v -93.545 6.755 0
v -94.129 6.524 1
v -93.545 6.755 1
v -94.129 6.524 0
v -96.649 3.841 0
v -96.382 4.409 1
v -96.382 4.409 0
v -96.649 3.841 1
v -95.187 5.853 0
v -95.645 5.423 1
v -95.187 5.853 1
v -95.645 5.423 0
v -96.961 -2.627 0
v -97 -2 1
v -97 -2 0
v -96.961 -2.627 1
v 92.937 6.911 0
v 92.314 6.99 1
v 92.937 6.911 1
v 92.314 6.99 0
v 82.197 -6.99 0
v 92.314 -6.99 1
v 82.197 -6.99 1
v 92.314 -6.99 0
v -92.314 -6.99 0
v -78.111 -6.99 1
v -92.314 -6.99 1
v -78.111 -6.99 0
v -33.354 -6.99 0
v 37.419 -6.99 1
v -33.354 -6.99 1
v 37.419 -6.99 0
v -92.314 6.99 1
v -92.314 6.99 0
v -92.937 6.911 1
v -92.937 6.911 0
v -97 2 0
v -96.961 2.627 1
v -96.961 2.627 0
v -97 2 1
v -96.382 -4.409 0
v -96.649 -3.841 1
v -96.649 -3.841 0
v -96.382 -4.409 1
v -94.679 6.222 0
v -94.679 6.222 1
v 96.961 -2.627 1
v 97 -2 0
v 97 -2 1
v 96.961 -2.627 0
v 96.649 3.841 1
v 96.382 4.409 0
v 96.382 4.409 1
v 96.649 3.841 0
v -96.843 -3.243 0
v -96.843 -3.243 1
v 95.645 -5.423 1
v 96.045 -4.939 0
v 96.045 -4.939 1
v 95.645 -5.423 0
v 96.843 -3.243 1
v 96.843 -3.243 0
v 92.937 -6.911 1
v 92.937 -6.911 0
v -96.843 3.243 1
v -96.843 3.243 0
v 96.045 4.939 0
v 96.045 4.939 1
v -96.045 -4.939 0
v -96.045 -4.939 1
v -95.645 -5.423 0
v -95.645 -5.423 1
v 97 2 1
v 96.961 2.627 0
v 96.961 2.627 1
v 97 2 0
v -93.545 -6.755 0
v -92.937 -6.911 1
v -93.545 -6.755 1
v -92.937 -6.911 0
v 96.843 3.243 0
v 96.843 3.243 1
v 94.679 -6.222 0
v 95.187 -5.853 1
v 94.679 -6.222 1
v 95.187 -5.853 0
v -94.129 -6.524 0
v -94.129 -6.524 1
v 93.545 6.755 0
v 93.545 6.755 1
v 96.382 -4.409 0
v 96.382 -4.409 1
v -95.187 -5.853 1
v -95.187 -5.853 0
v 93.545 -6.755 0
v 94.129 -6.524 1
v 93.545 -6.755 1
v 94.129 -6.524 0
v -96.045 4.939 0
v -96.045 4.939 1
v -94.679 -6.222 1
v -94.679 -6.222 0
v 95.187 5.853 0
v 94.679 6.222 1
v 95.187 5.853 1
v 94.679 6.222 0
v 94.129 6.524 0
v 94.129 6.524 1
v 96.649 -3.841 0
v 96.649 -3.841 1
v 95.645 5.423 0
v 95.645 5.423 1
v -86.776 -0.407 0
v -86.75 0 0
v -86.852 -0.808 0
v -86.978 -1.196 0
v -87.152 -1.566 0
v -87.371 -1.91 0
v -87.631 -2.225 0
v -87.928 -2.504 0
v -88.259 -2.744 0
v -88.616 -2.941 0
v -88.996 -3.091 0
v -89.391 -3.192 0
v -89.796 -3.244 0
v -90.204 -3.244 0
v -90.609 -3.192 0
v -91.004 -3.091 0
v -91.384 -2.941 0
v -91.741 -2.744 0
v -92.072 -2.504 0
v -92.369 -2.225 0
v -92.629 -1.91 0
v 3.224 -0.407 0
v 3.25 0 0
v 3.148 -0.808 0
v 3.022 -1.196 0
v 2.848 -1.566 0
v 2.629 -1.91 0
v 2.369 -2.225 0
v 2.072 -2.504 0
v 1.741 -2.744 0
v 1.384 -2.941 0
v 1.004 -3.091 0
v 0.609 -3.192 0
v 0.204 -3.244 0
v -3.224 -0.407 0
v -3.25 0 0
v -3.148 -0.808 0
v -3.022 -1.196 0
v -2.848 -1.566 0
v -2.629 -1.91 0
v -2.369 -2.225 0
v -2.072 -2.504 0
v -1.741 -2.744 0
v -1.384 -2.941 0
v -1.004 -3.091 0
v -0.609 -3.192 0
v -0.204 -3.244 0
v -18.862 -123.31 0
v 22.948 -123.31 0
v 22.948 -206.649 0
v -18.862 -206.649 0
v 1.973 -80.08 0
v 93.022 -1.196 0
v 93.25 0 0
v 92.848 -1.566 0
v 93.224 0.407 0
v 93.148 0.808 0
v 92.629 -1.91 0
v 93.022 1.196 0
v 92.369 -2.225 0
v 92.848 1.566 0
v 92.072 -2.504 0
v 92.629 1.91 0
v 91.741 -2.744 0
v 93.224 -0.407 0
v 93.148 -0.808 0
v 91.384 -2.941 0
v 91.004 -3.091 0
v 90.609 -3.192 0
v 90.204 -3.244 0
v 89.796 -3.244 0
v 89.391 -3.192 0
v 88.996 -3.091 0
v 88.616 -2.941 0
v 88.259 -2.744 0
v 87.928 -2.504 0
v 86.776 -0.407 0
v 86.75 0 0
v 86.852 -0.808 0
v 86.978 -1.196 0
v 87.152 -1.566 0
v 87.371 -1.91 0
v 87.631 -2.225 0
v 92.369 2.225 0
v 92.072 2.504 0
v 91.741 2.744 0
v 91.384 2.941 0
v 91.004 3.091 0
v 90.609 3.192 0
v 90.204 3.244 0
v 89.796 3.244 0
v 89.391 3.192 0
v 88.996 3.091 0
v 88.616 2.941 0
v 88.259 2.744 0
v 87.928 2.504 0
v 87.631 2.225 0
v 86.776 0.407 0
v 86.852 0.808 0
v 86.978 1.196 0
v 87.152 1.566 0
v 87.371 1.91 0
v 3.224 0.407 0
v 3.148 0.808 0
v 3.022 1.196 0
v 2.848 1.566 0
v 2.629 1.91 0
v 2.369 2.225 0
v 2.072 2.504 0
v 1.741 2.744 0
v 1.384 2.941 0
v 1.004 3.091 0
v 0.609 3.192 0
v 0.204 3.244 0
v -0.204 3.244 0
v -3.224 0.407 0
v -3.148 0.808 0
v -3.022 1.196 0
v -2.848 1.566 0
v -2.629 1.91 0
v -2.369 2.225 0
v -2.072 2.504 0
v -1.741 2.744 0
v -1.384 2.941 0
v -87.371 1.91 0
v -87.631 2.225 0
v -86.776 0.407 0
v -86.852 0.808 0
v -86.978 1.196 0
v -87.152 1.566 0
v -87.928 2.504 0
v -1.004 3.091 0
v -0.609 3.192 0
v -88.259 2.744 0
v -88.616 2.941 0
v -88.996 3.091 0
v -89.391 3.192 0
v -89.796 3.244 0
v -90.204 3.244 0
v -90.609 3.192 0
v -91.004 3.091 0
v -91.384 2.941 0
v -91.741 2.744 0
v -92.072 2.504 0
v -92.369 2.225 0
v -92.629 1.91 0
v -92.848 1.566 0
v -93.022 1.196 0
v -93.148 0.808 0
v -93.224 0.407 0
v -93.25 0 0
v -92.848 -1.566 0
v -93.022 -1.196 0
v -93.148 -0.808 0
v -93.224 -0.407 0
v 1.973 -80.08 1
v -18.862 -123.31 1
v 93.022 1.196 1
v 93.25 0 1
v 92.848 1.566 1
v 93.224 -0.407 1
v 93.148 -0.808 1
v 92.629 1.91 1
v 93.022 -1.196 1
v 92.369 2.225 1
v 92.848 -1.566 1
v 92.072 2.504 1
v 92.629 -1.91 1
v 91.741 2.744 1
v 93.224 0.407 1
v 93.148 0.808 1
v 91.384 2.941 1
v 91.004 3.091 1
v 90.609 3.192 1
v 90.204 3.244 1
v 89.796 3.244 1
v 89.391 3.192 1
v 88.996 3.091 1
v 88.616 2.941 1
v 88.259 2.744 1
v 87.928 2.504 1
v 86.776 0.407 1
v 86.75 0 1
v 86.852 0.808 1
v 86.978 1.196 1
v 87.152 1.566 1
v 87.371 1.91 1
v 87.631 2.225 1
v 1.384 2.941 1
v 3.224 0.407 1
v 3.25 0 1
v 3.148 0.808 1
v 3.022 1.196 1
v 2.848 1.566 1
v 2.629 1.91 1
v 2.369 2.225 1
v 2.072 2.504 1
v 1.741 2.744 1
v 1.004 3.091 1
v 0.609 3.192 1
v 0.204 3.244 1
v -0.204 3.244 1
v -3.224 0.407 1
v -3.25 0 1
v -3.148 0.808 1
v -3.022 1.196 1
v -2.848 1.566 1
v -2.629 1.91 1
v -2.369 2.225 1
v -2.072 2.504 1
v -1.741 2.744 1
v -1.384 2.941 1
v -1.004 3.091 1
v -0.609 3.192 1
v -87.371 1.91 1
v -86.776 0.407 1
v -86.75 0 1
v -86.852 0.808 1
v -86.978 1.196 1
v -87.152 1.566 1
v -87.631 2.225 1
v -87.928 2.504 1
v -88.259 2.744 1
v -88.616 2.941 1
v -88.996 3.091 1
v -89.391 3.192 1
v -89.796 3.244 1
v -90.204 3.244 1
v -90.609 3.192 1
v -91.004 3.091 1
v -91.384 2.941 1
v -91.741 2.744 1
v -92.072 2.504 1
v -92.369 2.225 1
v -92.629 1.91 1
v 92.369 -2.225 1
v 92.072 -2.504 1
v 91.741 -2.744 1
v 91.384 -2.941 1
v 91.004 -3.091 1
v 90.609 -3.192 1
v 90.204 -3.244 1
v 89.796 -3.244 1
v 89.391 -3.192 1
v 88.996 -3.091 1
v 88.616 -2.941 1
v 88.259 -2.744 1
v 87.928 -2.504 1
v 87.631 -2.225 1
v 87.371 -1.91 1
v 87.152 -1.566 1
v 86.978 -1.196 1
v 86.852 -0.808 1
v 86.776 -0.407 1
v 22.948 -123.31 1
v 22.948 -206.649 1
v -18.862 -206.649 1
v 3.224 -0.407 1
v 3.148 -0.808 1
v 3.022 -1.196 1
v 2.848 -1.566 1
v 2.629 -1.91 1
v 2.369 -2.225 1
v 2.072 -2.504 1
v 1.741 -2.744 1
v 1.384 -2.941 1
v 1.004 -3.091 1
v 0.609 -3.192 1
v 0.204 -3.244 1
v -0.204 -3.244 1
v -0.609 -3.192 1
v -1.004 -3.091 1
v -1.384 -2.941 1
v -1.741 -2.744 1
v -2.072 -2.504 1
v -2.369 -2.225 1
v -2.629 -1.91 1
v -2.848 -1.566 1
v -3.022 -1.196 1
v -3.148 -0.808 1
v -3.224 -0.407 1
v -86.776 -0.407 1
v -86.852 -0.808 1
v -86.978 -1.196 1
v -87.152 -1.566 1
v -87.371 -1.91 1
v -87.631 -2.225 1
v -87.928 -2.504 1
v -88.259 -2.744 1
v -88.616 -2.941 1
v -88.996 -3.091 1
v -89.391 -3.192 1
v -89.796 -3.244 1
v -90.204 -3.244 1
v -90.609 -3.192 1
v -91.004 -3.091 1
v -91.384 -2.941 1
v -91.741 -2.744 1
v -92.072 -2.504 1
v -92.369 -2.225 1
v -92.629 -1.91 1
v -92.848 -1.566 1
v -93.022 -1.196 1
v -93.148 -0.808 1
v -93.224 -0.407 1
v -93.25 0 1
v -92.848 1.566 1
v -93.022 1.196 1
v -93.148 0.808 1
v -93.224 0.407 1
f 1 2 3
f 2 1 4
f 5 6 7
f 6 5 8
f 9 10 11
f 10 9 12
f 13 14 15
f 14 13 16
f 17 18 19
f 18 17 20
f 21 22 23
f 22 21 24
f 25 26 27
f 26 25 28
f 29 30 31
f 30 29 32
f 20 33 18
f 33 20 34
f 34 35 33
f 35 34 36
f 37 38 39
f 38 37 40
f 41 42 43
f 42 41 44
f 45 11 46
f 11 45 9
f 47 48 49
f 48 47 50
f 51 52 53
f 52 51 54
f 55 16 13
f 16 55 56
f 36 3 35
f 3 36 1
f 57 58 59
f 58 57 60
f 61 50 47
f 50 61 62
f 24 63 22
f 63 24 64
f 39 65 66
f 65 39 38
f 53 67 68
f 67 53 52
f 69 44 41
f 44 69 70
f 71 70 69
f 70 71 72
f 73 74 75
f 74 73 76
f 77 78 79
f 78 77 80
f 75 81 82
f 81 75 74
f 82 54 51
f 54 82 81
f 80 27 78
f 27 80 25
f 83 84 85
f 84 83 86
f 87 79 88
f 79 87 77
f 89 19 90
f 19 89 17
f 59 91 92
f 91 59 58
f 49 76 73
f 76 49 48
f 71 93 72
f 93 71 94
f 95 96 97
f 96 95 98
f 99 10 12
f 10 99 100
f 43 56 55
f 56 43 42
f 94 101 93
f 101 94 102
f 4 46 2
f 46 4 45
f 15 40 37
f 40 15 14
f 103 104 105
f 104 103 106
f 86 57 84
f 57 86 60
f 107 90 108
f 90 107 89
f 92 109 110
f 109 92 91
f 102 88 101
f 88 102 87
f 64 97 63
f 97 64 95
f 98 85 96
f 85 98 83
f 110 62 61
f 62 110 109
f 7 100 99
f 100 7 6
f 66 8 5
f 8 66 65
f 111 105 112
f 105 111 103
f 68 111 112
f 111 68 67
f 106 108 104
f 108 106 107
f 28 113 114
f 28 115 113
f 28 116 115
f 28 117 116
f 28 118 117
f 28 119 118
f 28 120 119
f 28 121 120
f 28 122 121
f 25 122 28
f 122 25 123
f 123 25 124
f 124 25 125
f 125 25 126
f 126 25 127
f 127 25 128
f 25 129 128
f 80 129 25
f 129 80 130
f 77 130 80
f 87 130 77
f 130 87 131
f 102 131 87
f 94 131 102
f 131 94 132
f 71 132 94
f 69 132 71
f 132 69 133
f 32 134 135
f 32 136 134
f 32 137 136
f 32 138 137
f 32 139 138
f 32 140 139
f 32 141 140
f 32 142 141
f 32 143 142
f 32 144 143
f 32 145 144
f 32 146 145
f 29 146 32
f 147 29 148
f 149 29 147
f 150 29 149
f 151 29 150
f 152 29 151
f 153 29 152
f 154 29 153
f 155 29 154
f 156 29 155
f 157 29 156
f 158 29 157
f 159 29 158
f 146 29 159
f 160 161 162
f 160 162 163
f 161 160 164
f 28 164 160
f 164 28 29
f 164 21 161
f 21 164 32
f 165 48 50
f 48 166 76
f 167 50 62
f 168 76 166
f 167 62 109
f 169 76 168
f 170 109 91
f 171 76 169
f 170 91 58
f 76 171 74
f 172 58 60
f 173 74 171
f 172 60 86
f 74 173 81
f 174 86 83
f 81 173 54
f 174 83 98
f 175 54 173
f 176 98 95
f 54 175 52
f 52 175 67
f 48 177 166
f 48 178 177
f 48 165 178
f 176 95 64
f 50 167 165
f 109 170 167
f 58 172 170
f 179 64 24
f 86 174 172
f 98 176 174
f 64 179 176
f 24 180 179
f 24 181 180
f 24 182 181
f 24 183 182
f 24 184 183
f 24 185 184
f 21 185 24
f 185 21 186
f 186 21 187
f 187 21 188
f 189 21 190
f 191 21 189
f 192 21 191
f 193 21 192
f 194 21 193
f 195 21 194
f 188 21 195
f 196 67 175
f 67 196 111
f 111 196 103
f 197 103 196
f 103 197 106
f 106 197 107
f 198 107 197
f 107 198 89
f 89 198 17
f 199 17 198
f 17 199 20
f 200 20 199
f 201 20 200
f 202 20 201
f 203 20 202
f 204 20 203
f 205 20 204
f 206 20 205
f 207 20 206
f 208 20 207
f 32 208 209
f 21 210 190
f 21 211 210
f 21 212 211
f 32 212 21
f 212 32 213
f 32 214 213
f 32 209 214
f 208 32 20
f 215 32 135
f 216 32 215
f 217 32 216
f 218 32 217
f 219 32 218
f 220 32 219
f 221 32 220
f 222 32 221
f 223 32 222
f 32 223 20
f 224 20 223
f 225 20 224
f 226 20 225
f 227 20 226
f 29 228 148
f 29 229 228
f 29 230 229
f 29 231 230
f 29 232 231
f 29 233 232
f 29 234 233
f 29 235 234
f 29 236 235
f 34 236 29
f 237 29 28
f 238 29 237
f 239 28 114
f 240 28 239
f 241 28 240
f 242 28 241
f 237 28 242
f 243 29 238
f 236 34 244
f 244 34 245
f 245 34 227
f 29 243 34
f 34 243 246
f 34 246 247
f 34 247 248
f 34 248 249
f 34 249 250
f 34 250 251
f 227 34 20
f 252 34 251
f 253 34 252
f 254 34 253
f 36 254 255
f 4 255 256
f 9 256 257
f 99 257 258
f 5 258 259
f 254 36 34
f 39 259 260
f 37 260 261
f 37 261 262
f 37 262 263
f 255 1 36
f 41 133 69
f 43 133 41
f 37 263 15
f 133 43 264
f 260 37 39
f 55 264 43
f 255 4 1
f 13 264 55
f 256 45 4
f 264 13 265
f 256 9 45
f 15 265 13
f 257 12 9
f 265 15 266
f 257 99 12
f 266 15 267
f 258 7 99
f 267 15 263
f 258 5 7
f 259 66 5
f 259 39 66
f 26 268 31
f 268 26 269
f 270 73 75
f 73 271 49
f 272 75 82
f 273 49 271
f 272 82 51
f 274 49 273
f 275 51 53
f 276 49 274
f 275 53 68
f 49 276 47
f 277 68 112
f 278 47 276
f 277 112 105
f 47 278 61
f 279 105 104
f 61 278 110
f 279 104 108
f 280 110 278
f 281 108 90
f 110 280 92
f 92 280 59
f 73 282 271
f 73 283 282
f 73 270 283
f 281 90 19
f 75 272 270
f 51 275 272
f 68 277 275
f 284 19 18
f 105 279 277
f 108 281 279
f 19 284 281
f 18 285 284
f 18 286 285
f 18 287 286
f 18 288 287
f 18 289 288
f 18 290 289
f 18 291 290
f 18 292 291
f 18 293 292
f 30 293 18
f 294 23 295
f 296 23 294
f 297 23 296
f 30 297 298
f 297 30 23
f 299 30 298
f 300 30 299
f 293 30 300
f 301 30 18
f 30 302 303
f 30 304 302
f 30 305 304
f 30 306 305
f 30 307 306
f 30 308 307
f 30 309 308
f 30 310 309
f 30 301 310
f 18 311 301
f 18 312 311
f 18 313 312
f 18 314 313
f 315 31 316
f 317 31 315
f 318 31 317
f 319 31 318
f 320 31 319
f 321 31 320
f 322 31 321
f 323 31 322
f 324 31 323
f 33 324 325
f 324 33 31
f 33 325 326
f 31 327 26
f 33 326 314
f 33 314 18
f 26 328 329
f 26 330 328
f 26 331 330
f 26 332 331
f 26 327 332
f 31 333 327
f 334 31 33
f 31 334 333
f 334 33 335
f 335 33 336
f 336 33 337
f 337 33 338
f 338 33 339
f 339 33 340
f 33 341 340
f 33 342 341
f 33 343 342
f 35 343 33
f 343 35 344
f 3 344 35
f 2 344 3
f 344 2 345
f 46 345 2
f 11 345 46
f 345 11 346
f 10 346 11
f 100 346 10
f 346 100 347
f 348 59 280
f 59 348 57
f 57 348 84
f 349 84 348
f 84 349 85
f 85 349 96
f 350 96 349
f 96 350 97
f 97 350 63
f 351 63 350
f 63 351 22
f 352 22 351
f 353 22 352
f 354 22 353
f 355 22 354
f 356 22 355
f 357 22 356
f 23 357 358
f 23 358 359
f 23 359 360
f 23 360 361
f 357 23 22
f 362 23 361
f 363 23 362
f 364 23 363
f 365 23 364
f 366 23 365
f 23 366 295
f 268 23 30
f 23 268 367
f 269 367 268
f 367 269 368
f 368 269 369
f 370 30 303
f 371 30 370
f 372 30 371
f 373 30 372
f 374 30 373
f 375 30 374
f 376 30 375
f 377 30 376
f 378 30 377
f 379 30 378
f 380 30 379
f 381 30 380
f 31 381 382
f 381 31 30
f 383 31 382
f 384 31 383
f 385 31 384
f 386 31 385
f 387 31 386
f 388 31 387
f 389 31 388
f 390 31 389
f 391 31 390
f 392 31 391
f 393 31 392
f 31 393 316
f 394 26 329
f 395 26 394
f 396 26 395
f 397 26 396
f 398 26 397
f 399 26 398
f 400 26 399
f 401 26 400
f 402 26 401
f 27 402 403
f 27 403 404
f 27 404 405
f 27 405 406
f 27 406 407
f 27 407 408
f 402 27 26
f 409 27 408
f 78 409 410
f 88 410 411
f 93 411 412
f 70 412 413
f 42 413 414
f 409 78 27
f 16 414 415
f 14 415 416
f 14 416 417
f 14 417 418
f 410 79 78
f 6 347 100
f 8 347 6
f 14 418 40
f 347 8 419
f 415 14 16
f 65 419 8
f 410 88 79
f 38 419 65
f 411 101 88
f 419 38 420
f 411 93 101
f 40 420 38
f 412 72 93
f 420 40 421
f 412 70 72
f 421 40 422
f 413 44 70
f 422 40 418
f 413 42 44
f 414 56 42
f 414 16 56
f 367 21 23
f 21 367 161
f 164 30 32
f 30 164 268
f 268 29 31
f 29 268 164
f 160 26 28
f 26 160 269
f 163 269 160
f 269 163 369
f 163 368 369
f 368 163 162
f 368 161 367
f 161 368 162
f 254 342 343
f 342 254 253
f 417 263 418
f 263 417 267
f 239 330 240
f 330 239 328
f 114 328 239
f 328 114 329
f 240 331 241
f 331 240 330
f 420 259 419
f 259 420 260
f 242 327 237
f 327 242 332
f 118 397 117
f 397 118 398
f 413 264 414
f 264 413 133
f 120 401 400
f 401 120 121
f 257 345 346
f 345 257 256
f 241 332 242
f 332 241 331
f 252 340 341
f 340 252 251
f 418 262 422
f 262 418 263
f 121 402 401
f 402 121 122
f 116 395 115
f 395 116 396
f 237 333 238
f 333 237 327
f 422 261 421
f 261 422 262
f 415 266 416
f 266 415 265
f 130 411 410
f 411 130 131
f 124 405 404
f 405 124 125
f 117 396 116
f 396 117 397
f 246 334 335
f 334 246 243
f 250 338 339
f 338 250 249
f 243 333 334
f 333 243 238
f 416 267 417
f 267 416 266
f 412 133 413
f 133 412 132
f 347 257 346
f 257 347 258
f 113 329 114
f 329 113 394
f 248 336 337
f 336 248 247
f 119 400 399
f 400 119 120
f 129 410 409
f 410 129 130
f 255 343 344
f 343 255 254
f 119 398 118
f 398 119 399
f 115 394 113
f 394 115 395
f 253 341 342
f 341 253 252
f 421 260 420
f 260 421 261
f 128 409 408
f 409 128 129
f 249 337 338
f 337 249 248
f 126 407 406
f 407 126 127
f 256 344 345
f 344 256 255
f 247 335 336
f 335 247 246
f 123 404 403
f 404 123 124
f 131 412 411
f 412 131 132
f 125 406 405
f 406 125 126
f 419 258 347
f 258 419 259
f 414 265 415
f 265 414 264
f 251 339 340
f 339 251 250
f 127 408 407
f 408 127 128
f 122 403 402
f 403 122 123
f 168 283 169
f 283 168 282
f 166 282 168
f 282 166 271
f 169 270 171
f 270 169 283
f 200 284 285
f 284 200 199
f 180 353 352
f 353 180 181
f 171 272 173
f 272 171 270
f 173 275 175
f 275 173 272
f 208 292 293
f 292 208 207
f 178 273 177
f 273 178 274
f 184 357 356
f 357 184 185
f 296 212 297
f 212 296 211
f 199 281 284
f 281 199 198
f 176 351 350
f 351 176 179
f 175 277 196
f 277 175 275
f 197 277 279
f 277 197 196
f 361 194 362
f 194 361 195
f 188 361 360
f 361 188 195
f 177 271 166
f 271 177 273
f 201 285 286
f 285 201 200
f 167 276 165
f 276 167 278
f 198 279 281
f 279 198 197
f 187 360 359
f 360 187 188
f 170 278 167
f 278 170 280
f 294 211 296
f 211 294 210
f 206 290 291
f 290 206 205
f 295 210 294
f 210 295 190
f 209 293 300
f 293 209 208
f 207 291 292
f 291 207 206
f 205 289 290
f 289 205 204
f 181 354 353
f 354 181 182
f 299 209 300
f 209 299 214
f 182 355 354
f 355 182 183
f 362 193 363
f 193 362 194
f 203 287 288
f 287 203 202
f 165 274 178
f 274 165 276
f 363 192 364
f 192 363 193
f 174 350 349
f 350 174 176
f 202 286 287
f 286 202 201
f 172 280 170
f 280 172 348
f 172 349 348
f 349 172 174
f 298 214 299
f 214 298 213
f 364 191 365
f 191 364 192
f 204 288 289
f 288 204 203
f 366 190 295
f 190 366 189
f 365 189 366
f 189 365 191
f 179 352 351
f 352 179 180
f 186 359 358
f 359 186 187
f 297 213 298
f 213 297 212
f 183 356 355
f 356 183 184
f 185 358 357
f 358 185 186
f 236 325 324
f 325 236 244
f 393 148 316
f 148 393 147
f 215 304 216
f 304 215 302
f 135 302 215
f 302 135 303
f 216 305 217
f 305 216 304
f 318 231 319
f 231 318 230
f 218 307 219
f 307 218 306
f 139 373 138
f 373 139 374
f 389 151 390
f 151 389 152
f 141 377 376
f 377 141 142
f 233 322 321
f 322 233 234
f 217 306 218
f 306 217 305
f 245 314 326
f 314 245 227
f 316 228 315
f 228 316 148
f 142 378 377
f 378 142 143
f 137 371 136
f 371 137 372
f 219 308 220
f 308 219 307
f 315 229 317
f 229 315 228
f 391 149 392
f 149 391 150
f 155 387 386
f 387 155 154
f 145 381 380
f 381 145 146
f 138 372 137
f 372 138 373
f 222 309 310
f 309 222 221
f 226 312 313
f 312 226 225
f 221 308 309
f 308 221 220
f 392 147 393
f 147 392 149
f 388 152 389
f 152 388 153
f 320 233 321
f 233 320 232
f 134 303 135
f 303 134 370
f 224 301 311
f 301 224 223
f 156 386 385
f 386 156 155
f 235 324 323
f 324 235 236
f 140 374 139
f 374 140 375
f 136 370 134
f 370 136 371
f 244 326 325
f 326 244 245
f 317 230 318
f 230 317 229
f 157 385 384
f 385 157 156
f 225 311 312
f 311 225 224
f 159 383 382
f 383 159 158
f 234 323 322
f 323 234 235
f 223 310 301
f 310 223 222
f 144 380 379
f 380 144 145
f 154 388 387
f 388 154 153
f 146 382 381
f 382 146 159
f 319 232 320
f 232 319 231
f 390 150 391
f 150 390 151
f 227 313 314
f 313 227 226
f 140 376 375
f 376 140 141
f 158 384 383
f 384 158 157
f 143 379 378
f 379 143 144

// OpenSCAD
$fn = 50;


difference() {
	union() {
		translate(v = [0, 0, 0]) {
			rotate(a = [0, 0, 0]) {
				hull() {
					translate(v = [-92.0000000000, 2.0000000000, 0]) {
						rotate(a = [0, 0, 0]) {
							translate(v = [0, 0, 0]) {
								rotate(a = [0, 0, 0]) {
									cylinder(h = 1, r = 5);
								}
							}
						}
					}
					translate(v = [92.0000000000, 2.0000000000, 0]) {
						rotate(a = [0, 0, 0]) {
							translate(v = [0, 0, 0]) {
								rotate(a = [0, 0, 0]) {
									cylinder(h = 1, r = 5);
								}
							}
						}
					}
					translate(v = [-92.0000000000, -2.0000000000, 0]) {
						rotate(a = [0, 0, 0]) {
							translate(v = [0, 0, 0]) {
								rotate(a = [0, 0, 0]) {
									cylinder(h = 1, r = 5);
								}
							}
						}
					}
					translate(v = [92.0000000000, -2.0000000000, 0]) {
						rotate(a = [0, 0, 0]) {
							translate(v = [0, 0, 0]) {
								rotate(a = [0, 0, 0]) {
									cylinder(h = 1, r = 5);
								}
							}
						}
					}
				}
			}
		}
		translate(v = [0, 0, 0]) {
			rotate(a = [0, 0, 0]) {
				linear_extrude(height = 1) {
					text(font = "DejaVu Sans Mono:style=Bold", halign = "center", size = 209.0000000000, text = "Y", valign = "top");
				}
			}
		}
	}
	union() {
		translate(v = [-90.0000000000, 0.0000000000, -125.0000000000]) {
			rotate(a = [0, 0, 0]) {
				cylinder(h = 250, r = 3.2500000000);
			}
		}
		translate(v = [90.0000000000, 0.0000000000, -125.0000000000]) {
			rotate(a = [0, 0, 0]) {
				cylinder(h = 250, r = 3.2500000000);
			}
		}
		translate(v = [90.0000000000, 0.0000000000, -125.0000000000]) {
			rotate(a = [0, 0, 0]) {
				cylinder(h = 250, r = 3.2500000000);
			}
		}
		translate(v = [0, 0, -125.0000000000]) {
			rotate(a = [0, 0, 0]) {
				cylinder(h = 250, r = 3.2500000000);
			}
		}
	}
}
